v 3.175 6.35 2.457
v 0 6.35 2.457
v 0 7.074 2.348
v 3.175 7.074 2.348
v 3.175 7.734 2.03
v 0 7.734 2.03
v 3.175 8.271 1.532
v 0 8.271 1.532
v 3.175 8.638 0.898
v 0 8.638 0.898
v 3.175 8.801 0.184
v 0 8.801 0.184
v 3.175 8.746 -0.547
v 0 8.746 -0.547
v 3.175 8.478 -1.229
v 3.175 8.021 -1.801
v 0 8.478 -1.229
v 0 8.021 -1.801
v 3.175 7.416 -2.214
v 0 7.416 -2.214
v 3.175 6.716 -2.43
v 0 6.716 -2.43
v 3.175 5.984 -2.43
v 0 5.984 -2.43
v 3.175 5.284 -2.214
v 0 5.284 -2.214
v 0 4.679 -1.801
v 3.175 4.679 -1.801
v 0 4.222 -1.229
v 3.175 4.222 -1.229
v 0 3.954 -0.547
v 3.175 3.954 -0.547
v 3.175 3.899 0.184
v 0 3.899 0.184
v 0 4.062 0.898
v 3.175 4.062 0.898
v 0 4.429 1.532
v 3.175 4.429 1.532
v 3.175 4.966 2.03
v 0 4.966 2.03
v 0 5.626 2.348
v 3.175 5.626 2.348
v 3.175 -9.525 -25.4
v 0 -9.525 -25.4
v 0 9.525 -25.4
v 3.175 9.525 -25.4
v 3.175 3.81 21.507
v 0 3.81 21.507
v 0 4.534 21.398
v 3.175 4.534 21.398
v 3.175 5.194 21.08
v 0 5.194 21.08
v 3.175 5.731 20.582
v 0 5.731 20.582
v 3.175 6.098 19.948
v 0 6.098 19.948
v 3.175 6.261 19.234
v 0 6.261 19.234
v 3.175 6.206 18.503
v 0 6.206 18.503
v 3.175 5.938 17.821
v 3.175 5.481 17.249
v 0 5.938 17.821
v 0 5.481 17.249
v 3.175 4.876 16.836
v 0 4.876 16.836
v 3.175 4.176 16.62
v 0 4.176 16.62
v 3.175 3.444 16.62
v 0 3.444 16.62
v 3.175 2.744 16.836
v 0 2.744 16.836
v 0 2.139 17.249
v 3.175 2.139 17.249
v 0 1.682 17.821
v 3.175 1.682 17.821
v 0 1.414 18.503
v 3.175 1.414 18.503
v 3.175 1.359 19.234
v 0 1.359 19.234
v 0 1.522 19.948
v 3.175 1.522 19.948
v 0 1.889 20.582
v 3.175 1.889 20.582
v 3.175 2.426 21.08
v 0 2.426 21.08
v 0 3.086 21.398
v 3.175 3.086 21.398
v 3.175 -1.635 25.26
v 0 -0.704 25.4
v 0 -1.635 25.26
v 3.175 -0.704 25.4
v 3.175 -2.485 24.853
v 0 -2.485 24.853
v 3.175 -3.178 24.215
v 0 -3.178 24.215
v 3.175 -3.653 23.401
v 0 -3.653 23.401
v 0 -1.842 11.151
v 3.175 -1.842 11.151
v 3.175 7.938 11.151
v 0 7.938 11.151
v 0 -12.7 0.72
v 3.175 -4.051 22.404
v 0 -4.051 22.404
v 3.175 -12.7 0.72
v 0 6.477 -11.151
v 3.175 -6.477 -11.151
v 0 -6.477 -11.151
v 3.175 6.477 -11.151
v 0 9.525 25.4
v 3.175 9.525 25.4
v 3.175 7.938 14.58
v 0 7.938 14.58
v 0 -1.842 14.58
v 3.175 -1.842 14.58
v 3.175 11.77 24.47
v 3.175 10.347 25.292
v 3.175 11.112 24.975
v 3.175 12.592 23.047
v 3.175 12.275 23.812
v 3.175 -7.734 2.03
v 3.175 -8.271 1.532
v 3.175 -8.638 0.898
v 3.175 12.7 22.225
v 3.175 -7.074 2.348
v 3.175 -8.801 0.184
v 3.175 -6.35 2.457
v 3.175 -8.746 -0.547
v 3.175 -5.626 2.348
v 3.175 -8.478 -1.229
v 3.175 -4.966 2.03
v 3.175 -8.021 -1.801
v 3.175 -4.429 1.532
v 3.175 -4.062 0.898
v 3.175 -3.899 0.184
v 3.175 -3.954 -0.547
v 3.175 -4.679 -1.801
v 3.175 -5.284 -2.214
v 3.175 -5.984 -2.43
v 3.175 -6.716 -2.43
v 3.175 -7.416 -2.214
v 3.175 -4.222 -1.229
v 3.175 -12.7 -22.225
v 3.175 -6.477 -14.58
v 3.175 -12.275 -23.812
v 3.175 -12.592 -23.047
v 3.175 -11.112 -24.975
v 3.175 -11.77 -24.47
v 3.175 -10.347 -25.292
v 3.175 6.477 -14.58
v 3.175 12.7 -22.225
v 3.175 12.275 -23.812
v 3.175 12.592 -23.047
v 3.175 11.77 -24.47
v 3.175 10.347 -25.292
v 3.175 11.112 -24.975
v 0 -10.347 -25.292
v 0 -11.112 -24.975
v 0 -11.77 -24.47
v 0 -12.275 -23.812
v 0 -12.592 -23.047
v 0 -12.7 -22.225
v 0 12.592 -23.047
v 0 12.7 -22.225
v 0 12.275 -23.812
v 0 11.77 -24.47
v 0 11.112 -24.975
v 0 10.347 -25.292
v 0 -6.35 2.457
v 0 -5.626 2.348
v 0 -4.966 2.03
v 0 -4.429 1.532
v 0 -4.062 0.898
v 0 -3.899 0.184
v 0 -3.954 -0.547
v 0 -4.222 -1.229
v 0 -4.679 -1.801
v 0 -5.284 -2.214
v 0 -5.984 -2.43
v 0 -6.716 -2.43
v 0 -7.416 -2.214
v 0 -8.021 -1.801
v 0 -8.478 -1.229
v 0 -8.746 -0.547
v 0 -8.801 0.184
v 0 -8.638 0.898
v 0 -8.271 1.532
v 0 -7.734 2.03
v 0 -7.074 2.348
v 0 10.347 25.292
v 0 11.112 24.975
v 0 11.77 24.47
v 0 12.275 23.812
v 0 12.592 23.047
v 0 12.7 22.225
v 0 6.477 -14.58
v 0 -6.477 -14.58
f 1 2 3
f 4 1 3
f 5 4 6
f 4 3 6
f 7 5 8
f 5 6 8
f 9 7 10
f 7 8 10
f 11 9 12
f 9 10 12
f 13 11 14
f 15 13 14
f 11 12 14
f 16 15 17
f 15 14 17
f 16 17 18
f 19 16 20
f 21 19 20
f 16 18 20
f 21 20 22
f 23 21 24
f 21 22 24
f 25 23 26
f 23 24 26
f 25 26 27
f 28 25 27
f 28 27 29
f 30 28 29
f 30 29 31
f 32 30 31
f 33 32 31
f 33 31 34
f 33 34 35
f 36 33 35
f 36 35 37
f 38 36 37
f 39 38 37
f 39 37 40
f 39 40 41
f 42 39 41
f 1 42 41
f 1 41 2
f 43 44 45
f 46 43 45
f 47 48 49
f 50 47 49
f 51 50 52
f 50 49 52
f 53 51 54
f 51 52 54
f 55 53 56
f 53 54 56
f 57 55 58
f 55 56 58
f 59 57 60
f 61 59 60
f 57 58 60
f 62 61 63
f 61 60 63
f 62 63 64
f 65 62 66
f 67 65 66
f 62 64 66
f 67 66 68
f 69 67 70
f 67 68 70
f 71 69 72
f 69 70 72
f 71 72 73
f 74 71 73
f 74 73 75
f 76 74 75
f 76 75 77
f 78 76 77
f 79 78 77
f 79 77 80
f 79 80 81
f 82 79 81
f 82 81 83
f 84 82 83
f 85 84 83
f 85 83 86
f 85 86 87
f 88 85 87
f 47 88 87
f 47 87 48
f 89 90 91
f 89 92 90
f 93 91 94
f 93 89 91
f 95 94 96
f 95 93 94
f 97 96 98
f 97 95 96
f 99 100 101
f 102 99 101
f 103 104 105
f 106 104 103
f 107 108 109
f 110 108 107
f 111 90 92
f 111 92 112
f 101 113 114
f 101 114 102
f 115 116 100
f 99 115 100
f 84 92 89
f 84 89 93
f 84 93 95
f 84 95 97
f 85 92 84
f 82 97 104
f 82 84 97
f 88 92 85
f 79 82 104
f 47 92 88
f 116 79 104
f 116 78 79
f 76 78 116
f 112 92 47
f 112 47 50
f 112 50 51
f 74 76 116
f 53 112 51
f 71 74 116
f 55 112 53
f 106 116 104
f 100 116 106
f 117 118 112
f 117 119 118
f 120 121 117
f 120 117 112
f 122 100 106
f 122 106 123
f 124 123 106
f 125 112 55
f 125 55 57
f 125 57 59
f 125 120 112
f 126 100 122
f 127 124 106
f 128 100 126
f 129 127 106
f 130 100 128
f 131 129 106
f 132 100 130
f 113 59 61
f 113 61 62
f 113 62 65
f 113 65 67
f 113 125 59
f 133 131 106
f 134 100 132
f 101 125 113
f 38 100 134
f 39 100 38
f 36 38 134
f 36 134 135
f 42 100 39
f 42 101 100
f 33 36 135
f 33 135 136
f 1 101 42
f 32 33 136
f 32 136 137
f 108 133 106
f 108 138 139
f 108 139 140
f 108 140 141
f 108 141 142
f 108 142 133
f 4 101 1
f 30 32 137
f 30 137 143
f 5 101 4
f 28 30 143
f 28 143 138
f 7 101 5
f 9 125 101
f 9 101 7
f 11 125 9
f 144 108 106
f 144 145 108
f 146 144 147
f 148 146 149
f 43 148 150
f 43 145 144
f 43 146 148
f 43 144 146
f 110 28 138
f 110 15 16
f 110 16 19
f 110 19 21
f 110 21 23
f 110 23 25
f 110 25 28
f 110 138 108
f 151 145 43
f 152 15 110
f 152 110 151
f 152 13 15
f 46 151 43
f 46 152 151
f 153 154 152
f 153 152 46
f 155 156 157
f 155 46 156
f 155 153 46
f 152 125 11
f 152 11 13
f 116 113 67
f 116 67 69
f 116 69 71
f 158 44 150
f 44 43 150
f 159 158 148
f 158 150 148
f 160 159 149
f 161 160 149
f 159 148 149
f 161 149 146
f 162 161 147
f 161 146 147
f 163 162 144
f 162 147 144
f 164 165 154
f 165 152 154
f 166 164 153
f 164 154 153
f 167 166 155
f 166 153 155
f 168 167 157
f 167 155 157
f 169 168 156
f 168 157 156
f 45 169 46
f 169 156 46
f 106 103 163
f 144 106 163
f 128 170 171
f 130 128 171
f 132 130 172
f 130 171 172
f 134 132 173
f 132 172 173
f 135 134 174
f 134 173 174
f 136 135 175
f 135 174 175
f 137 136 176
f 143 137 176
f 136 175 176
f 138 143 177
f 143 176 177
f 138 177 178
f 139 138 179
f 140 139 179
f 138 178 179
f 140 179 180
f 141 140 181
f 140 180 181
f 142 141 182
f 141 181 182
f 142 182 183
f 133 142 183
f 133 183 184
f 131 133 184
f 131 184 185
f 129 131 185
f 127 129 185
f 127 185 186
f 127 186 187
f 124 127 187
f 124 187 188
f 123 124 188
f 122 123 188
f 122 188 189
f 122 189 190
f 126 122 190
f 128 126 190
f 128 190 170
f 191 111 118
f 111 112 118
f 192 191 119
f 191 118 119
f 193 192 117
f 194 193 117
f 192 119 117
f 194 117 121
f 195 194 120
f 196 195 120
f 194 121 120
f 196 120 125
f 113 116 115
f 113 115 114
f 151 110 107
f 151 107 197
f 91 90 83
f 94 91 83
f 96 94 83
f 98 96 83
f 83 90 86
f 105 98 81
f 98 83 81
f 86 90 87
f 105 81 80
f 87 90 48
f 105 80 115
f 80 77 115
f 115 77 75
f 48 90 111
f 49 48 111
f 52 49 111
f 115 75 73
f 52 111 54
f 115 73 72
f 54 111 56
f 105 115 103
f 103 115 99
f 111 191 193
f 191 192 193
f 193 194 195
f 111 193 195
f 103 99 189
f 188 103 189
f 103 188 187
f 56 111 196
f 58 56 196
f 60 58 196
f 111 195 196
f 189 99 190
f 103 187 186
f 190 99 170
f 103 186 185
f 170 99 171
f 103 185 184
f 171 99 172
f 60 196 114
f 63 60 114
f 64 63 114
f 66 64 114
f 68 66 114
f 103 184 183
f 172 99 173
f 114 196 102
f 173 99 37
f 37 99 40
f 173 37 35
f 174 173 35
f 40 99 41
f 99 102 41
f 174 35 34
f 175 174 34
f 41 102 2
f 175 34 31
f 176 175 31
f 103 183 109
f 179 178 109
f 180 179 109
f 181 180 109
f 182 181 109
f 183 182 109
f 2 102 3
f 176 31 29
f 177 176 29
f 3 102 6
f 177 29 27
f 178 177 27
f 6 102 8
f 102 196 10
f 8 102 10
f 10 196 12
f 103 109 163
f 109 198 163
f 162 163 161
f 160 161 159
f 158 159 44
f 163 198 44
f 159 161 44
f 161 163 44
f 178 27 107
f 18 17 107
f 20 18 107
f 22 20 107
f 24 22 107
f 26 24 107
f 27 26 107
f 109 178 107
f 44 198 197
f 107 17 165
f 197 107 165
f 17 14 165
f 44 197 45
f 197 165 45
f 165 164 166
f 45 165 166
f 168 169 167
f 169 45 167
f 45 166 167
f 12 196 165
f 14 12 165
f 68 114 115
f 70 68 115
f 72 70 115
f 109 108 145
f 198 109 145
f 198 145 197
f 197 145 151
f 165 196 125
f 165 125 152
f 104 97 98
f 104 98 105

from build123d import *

# Parameters (mm, degrees)
SKETCH2_W                    = 50.8
SKETCH2_H                    = 25.4
BOSS_EXTRUDE1_DEPTH          = 3.175
CUT_EXTRUDE2_DEPTH           = 4.175
FILLET2_R                    = 3.175
SKETCH5_W                    = 3.429
SKETCH5_H                    = 9.779
SKETCH5_H_2                  = 12.954
CUT_EXTRUDE3_DEPTH           = 4.175
F_10_0_1935_DIAMETER_HOLE1_D = 4.9149


with BuildPart() as part:
    # Sketch2 → Boss-Extrude1 (new body)
    with BuildSketch(Plane(origin=(0, 0, 0), x_dir=(0, 0, -1), z_dir=(1, 0, 0))):
        Rectangle(SKETCH2_W, SKETCH2_H)
    extrude(amount=BOSS_EXTRUDE1_DEPTH)

    # Sketch4 → Cut-Extrude2 (cut, through all)
    with BuildSketch(Plane(origin=(3.175, 0, 0), x_dir=(0, 0, -1), z_dir=(1, 0, 0))):
        Polygon((0, -12.98702), (-25.4, -12.7), (-46.852380557, -12.7), (-46.852380557, 5.701326041), (-22.403810306, -4.050651033), align=None)
    extrude(amount=-CUT_EXTRUDE2_DEPTH, mode=Mode.SUBTRACT)

    # Fillet2
    fillet2_edges = [part.edges().sort_by_distance(p)[0] for p in [
        (1.5875, -2.855539298, 25.4),
        (1.5875, 12.7, 25.4),
        (1.5875, 12.7, -25.4),
        (1.5875, -12.7, -25.4),
    ]]
    fillet(fillet2_edges, radius=FILLET2_R)

    # Sketch5 → Cut-Extrude3 (cut, through all)
    with BuildSketch(Plane(origin=(3.175, 0, 0), x_dir=(0, 0, -1), z_dir=(1, 0, 0))):
        with Locations((-12.8651, 3.048)):
            Rectangle(SKETCH5_W, SKETCH5_H)
        with Locations((12.8651, 0)):
            Rectangle(SKETCH5_W, SKETCH5_H_2)
    extrude(amount=-CUT_EXTRUDE3_DEPTH, mode=Mode.SUBTRACT)

    # #10 (0.1935) Diameter Hole1 (through all)
    with Locations(Plane(origin=(3.175, 0, 0), x_dir=(0, 0, -1), z_dir=(1, 0, 0))):
        with Locations((-19.05, 3.81), (0, -6.35), (0, 6.35)):
            Hole(F_10_0_1935_DIAMETER_HOLE1_D / 2)


solid = part.part
